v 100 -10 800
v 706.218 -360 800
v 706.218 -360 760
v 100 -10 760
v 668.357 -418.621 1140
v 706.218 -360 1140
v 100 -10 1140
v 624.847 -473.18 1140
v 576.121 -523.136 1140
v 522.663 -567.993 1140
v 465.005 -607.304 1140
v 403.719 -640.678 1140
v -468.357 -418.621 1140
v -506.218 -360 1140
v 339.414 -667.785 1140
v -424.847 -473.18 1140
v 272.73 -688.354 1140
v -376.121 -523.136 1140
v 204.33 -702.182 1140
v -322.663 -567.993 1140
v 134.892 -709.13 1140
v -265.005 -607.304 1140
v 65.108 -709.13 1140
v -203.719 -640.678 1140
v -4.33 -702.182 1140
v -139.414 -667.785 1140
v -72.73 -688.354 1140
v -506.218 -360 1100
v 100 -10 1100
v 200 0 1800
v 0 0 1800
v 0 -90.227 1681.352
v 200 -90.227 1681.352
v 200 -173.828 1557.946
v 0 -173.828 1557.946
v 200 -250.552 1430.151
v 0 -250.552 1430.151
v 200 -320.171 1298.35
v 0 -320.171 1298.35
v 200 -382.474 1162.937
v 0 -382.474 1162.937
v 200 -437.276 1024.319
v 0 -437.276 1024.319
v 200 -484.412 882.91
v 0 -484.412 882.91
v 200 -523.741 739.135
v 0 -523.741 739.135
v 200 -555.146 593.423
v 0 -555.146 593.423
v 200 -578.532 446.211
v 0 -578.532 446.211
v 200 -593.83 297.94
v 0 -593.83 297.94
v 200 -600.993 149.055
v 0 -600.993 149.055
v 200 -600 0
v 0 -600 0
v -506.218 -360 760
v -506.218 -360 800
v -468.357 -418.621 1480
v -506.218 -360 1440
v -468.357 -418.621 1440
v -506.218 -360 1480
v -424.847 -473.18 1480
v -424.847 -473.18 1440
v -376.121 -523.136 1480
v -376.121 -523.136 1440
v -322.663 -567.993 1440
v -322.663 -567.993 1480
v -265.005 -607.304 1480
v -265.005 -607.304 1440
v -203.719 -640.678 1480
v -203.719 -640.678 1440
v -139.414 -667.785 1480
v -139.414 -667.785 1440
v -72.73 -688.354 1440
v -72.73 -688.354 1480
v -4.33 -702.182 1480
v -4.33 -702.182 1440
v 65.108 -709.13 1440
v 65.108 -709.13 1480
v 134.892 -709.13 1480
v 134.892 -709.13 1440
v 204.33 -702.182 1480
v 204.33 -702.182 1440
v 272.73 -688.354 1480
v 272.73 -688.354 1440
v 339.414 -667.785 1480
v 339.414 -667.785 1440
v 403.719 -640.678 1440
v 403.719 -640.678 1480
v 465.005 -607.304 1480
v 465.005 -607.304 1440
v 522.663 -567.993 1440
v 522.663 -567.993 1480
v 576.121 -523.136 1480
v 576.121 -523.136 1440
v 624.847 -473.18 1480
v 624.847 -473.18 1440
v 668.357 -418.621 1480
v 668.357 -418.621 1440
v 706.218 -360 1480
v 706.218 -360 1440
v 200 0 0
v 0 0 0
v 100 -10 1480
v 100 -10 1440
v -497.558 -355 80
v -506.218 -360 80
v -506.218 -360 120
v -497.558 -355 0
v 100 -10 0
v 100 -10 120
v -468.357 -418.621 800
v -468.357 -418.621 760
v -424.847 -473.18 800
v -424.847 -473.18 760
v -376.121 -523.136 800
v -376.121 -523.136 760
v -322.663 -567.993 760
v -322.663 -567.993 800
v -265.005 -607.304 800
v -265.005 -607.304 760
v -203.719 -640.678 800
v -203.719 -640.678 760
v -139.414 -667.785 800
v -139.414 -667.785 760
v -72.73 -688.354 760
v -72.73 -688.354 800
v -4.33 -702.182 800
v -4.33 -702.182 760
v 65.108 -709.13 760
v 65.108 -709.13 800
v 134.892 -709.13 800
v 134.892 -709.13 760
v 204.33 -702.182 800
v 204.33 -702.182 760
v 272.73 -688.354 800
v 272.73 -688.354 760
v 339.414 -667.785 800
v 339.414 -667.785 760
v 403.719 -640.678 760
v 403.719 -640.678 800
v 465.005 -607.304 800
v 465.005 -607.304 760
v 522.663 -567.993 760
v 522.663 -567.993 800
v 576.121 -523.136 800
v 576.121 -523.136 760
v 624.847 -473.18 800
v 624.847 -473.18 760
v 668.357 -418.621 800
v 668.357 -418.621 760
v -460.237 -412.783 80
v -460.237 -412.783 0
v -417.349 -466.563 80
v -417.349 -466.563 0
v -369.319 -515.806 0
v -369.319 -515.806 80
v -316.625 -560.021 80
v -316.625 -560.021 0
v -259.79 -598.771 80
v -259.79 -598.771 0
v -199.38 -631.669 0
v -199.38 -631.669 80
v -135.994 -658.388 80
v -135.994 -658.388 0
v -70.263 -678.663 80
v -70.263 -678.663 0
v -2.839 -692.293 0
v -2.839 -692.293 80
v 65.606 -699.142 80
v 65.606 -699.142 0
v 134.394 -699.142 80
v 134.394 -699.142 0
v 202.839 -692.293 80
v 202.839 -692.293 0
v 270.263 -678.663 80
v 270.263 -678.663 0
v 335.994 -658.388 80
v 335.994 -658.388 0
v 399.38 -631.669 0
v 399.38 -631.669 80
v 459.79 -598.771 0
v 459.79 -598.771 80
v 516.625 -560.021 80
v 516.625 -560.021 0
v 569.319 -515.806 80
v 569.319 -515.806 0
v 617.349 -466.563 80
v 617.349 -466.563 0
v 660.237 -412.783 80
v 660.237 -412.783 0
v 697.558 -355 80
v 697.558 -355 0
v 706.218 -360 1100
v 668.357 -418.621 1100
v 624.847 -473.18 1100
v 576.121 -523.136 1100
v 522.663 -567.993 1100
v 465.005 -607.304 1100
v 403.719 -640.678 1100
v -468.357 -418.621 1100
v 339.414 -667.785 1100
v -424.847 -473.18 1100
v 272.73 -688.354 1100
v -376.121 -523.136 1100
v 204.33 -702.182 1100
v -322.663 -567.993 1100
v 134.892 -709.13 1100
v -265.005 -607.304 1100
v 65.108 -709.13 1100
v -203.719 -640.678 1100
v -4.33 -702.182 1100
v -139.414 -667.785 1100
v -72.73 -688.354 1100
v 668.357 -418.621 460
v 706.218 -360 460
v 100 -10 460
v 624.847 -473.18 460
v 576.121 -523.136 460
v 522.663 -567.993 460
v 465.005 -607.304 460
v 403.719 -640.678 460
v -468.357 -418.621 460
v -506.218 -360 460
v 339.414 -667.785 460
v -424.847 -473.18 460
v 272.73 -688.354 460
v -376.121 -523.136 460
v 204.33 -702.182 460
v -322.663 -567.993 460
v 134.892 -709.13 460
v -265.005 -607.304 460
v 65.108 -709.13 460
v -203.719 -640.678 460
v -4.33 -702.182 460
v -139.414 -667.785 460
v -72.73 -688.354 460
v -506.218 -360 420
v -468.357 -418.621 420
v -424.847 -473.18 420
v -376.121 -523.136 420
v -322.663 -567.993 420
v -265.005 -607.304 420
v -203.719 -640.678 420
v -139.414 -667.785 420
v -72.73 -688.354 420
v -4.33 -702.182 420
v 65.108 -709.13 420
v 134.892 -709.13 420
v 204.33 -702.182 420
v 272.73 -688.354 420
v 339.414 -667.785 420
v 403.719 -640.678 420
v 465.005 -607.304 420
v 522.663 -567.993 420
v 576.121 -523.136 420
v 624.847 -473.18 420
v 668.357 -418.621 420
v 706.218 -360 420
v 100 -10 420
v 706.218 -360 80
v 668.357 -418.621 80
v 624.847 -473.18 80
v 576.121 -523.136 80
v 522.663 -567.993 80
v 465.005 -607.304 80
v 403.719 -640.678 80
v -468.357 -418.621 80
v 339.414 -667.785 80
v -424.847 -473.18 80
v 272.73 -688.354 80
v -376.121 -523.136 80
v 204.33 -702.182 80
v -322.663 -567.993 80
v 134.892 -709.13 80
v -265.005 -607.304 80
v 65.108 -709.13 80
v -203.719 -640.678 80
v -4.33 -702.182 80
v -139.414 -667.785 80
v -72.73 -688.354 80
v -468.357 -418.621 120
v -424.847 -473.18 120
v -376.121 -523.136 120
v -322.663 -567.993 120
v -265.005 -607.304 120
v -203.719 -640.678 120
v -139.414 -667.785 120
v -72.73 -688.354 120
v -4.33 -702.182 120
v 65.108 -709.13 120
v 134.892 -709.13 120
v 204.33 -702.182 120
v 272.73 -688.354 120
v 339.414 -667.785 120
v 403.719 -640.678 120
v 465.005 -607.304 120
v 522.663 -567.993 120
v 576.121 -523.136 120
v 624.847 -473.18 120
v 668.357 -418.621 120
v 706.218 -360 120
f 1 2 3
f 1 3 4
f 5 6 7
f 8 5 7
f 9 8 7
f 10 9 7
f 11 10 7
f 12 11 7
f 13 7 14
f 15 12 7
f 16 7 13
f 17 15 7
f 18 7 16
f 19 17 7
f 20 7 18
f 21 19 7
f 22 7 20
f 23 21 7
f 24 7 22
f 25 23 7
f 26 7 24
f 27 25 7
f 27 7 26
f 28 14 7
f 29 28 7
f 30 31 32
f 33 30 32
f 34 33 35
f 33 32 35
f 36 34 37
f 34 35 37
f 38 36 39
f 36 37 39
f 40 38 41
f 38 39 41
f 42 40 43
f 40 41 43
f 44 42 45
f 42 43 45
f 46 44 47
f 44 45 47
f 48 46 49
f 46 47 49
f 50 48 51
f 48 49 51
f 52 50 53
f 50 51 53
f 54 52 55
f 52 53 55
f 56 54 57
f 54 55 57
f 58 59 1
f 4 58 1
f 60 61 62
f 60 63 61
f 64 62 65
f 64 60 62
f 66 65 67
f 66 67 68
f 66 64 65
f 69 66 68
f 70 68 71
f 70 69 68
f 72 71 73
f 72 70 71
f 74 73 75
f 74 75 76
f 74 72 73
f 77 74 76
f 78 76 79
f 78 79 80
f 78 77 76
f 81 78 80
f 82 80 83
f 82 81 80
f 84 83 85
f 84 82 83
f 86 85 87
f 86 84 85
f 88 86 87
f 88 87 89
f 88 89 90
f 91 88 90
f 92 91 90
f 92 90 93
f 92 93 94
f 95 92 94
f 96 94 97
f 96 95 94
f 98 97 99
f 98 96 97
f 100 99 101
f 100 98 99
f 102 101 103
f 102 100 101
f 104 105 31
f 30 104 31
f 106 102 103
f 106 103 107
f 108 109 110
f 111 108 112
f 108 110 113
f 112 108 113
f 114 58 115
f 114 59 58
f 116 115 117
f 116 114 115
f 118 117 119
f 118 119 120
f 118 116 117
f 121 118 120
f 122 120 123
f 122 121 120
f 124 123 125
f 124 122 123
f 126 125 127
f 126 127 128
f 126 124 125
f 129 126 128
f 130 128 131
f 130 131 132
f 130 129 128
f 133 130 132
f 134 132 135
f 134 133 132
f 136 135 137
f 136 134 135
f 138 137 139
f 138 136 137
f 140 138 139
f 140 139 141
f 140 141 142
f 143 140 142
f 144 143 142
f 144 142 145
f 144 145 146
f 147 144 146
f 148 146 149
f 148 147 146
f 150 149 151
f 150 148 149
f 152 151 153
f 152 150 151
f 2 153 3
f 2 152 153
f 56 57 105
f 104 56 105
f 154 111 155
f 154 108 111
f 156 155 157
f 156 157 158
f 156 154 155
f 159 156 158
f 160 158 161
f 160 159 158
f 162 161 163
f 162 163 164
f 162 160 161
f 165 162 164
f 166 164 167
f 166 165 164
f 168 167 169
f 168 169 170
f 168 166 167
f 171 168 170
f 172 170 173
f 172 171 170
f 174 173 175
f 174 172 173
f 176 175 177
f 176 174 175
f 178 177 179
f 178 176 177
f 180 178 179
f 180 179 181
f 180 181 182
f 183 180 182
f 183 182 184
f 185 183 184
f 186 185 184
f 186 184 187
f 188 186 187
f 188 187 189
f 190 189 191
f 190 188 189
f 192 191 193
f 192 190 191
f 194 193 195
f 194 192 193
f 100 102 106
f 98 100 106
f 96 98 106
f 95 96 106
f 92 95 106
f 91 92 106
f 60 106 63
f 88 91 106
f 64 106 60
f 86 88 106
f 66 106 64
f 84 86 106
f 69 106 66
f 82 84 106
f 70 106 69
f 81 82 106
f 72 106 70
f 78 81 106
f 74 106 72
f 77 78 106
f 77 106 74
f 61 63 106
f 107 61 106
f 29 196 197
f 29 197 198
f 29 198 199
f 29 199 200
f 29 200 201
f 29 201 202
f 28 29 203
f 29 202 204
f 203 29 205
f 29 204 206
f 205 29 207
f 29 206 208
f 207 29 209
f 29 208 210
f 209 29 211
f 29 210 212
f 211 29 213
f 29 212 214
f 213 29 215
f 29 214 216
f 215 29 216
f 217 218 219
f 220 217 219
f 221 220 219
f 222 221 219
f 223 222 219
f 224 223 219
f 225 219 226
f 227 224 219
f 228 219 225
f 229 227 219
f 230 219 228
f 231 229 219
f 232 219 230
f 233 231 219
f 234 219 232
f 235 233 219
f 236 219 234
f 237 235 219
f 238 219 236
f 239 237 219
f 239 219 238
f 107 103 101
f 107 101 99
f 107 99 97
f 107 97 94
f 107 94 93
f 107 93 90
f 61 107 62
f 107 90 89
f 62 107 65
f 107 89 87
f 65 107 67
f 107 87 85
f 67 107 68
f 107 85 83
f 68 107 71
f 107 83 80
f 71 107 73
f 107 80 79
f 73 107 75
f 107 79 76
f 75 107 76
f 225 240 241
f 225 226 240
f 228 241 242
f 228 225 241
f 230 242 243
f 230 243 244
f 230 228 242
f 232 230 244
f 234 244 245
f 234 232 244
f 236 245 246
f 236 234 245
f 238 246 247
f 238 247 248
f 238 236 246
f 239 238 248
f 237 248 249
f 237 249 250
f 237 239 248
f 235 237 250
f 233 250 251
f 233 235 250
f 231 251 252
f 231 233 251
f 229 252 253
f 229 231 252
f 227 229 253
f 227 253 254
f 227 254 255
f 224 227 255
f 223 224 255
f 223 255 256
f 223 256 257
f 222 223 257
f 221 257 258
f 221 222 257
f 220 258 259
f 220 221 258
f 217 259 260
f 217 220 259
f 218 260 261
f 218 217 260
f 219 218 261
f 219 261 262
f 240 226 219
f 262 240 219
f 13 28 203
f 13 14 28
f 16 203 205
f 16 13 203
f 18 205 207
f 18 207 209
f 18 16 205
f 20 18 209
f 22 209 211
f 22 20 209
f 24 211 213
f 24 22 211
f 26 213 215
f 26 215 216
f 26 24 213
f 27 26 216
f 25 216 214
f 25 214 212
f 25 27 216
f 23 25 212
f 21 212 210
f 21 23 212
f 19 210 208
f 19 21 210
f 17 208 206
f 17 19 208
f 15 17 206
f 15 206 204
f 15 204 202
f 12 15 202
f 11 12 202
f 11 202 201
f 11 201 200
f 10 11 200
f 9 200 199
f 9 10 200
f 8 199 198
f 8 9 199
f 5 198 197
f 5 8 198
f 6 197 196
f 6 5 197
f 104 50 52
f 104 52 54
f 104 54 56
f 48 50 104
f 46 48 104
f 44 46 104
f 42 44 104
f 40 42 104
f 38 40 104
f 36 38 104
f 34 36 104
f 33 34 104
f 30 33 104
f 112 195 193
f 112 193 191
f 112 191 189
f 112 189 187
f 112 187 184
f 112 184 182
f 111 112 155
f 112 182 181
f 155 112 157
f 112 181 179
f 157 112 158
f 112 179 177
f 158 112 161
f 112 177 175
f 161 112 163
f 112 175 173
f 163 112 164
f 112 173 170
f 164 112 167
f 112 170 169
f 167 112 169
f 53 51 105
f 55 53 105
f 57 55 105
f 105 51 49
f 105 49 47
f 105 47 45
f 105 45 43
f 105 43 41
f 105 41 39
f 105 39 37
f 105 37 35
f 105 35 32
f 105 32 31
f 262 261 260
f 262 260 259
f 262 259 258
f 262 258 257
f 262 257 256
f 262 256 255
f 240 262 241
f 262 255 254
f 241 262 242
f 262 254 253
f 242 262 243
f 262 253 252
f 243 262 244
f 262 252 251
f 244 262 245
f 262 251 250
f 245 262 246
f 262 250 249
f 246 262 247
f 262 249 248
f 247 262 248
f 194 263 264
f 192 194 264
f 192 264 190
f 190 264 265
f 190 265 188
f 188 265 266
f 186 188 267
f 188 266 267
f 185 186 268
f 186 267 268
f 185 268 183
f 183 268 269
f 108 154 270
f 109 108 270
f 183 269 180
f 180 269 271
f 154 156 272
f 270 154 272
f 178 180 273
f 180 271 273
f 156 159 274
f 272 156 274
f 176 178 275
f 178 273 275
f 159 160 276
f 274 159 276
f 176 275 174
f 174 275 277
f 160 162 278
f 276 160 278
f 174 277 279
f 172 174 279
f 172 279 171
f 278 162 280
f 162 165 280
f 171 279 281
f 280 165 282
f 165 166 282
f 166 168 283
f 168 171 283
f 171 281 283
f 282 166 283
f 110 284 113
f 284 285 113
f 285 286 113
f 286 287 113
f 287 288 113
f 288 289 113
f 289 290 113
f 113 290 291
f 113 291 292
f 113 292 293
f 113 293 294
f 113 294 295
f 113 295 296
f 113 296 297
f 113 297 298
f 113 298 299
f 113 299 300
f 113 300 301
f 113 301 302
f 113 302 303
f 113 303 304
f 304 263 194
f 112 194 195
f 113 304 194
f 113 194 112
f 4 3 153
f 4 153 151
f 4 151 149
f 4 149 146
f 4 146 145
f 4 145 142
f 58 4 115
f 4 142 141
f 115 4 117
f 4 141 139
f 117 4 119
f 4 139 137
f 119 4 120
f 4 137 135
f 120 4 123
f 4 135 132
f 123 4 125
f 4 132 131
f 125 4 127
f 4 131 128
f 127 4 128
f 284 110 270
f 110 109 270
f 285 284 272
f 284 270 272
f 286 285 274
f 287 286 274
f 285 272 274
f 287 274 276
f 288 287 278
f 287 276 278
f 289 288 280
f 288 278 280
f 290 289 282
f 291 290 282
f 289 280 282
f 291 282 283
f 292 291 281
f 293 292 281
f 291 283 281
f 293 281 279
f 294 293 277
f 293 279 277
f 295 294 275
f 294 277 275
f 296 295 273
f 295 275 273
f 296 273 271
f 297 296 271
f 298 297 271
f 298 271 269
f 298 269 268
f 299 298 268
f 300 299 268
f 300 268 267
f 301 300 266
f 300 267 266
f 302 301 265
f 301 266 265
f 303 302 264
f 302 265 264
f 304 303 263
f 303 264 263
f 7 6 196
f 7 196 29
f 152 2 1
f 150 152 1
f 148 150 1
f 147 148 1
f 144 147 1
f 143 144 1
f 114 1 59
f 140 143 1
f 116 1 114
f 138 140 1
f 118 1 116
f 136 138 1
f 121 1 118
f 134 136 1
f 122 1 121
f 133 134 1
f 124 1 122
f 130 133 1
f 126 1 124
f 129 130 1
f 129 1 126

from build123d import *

# Parameters (mm, degrees)
F4_DEPTH      = 200
F6_W          = 690
F6_H          = 80
F7_ANGLE_BACK = 60
F7_ANGLE      = 120
F6_W_2        = 700
F6_H_2        = 40


# Not quite as in the source:
# - a feature of the source that left no trace in its solid (it failed there, or was rolled back) is left out


with BuildPart() as f4:
    # F3 (on Right) → F4 (new body)
    with BuildSketch(Plane.YZ):
        with BuildLine():
            Line((-600, 0), (0, 0))
            Line((0, 0), (0, 1800))
            ThreePointArc((0, 1800), (-461.8112779608, 953.9370926536), (-600, 0))
        make_face()
    extrude(amount=F4_DEPTH)


with BuildPart() as f7:
    # F6 (on offset) → F7 (revolve)
    with BuildSketch(Plane.YZ.offset(100), mode=Mode.PRIVATE) as f7_sk:
        with Locations((-355, 40)):
            Rectangle(F6_W, F6_H)
        Polygon((-700, 80), (-10, 80), (-10, 120), (-710, 120), (-710, 80), align=None)
    revolve(f7_sk.sketch.rotate(Axis((100, -10, 40), (0, 0, 1)), -F7_ANGLE_BACK), axis=Axis((100, -10, 40), (0, 0, 1)), revolution_arc=F7_ANGLE)


with BuildPart() as f7b:
    # F6 (on offset) → F7, piece 2 (revolve)
    with BuildSketch(Plane.YZ.offset(100), mode=Mode.PRIVATE) as f7_sk:
        with Locations((-360, 440)):
            Rectangle(F6_W_2, F6_H_2)
    revolve(f7_sk.sketch.rotate(Axis((100, -10, 40), (0, 0, 1)), -F7_ANGLE_BACK), axis=Axis((100, -10, 40), (0, 0, 1)), revolution_arc=F7_ANGLE)


with BuildPart() as f7c:
    # F6 (on offset) → F7, piece 3 (revolve)
    with BuildSketch(Plane.YZ.offset(100), mode=Mode.PRIVATE) as f7_sk:
        with Locations((-360, 780)):
            Rectangle(F6_W_2, F6_H_2)
    revolve(f7_sk.sketch.rotate(Axis((100, -10, 40), (0, 0, 1)), -F7_ANGLE_BACK), axis=Axis((100, -10, 40), (0, 0, 1)), revolution_arc=F7_ANGLE)


with BuildPart() as f7d:
    # F6 (on offset) → F7, piece 4 (revolve)
    with BuildSketch(Plane.YZ.offset(100), mode=Mode.PRIVATE) as f7_sk:
        with Locations((-360, 1120)):
            Rectangle(F6_W_2, F6_H_2)
    revolve(f7_sk.sketch.rotate(Axis((100, -10, 40), (0, 0, 1)), -F7_ANGLE_BACK), axis=Axis((100, -10, 40), (0, 0, 1)), revolution_arc=F7_ANGLE)


with BuildPart() as f7e:
    # F6 (on offset) → F7, piece 5 (revolve)
    with BuildSketch(Plane.YZ.offset(100), mode=Mode.PRIVATE) as f7_sk:
        with Locations((-360, 1460)):
            Rectangle(F6_W_2, F6_H_2)
    revolve(f7_sk.sketch.rotate(Axis((100, -10, 40), (0, 0, 1)), -F7_ANGLE_BACK), axis=Axis((100, -10, 40), (0, 0, 1)), revolution_arc=F7_ANGLE)


solid = Compound([f4.part, f7.part, f7b.part, f7c.part, f7d.part, f7e.part])
